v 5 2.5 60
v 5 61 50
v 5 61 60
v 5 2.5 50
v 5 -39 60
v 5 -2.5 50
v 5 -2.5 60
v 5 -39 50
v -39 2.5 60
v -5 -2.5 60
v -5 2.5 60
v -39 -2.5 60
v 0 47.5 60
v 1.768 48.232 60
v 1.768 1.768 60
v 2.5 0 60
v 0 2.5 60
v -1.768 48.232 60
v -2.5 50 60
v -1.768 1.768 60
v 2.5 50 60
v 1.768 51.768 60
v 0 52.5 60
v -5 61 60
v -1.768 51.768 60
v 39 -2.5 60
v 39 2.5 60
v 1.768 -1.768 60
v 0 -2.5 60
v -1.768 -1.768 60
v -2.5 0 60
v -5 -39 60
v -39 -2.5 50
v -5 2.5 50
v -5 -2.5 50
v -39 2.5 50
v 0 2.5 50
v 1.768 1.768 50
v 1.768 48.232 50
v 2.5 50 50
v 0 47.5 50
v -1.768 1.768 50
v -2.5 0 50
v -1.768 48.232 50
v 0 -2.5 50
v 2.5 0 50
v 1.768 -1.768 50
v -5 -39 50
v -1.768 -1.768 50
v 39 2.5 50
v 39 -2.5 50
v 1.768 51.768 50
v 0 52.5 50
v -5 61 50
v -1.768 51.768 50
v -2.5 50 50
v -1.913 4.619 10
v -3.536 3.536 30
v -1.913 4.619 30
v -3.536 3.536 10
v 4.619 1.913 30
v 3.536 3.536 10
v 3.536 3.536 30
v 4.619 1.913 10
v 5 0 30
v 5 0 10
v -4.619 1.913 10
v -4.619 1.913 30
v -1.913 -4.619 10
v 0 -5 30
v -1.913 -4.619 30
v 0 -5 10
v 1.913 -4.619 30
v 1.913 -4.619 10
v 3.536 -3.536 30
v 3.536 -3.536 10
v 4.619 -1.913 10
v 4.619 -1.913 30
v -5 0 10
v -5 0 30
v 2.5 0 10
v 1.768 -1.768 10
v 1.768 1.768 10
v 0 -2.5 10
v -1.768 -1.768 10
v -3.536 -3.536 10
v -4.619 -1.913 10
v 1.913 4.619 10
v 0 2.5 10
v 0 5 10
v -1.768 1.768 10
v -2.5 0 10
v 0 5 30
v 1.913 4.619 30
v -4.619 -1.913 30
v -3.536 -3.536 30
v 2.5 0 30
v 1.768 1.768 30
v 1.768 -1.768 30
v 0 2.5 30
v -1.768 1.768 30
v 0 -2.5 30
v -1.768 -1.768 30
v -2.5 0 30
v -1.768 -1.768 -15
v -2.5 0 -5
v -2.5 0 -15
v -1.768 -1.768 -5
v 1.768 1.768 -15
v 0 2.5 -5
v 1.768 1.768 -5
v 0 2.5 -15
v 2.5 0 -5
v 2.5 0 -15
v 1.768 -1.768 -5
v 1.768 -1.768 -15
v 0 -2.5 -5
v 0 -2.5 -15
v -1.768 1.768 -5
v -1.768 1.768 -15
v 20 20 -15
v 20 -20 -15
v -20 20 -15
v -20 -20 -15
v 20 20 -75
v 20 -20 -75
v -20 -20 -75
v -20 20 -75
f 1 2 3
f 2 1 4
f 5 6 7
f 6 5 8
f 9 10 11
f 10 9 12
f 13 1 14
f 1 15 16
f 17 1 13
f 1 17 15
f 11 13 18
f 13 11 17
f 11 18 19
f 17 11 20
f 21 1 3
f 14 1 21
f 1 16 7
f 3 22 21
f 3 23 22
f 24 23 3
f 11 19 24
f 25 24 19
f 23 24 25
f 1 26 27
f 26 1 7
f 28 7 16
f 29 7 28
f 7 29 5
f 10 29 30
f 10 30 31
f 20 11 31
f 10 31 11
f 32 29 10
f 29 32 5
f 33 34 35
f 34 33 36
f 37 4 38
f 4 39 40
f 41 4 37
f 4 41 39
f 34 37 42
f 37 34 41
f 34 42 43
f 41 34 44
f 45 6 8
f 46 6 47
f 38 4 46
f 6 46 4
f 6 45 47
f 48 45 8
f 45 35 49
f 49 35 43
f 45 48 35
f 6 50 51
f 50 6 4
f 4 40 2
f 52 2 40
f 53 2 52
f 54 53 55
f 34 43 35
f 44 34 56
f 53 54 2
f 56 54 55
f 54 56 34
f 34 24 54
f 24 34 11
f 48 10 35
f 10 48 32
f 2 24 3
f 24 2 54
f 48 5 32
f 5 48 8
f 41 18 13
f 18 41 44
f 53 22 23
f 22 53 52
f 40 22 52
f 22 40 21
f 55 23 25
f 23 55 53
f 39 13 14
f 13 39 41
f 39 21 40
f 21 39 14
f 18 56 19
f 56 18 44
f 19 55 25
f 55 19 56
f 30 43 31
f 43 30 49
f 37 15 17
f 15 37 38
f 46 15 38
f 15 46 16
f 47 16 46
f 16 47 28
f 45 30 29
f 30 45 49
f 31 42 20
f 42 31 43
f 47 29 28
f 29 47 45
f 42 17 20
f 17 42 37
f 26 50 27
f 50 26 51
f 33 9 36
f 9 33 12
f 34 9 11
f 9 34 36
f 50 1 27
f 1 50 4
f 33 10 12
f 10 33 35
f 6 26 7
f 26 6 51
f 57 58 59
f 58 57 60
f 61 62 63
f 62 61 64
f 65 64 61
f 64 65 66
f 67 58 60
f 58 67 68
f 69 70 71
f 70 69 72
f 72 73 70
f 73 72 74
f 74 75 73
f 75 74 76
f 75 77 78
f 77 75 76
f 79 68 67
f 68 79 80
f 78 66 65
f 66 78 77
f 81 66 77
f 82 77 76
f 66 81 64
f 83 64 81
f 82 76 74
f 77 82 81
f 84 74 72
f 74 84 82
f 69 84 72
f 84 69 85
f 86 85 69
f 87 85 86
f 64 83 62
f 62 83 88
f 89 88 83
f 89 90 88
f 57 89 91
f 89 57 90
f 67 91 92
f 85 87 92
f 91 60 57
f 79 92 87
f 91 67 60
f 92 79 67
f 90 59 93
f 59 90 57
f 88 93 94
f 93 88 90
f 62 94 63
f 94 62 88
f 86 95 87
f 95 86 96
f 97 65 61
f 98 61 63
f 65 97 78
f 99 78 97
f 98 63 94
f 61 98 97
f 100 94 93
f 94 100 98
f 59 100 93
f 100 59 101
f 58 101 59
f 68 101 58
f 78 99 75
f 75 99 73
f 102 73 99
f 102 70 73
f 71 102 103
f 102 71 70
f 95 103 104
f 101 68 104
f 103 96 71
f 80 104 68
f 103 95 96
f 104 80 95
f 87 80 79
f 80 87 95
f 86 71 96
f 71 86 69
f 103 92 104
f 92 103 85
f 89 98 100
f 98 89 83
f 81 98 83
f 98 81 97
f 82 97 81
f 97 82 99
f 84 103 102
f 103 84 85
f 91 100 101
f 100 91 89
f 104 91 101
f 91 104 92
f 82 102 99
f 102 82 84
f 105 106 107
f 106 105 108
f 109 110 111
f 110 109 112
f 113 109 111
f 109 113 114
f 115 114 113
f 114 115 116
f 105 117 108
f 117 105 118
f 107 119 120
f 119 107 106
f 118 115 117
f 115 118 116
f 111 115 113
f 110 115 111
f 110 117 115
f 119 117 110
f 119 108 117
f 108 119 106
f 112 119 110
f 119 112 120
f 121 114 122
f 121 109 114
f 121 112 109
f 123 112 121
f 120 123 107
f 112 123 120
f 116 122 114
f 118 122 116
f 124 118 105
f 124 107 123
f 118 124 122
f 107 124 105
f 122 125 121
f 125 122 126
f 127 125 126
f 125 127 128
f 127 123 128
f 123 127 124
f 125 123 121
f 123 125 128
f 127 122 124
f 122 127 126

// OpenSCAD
difference(){ 

translate([-5,-39,50])

cube([10,100,10]);

translate([0,50,50])

cylinder(h=10,r=2.5);

translate([0,0,50])

cylinder(h=10,r=2.5);

}

difference(){

translate([-39,-2.5,50])

cube([78,5,10]);

translate([0,50,50])

cylinder(h=10,r=2.5);

translate([0,0,50])

cylinder(h=10,r=2.5);

}

difference(){

translate([0,0,10])

cylinder(h=20,r=5);

translate([0,0,10])

cylinder(h=20,r=2.5);

}

translate([0,0,-15])

cylinder(h=10,r=2.5);

translate([-20,-20,-75])

cube([40,40,60]);
